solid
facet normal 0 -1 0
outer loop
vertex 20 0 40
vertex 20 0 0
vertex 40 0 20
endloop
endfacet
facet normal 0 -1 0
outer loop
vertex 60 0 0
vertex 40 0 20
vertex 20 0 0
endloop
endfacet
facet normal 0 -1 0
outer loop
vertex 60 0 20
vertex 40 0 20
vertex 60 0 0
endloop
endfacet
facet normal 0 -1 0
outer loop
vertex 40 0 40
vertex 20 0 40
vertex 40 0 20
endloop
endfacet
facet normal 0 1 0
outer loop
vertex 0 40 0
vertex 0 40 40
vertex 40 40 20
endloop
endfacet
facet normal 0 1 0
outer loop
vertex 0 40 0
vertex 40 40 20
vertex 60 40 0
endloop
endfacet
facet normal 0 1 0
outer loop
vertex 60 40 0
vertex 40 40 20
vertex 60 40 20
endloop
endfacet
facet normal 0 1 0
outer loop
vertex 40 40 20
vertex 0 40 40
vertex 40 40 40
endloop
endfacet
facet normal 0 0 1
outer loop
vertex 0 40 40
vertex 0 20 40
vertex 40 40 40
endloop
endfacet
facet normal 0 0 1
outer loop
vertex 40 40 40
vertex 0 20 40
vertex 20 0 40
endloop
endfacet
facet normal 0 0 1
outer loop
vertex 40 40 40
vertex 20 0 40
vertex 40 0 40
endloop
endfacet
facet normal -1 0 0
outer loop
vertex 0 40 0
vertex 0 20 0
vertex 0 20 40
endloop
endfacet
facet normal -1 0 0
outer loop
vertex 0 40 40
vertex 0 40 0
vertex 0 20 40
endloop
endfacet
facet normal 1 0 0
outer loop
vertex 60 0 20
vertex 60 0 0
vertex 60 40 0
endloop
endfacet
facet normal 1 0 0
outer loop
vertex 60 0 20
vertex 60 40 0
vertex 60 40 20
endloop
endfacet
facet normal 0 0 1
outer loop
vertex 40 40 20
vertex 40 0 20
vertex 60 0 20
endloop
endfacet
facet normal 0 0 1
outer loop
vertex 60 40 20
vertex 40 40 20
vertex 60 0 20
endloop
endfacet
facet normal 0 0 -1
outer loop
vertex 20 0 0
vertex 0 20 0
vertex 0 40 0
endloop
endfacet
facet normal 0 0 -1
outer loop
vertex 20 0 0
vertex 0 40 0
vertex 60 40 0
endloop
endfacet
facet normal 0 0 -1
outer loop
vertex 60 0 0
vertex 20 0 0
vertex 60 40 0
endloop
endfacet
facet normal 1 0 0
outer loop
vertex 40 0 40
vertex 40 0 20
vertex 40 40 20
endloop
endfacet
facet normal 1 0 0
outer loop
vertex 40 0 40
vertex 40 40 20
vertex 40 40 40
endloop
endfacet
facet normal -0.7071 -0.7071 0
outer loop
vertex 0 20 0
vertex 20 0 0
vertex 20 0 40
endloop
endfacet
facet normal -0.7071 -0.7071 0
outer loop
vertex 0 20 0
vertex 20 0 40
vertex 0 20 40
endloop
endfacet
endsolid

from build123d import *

# Parameters (mm, degrees)
F0_W     = 60
F0_H     = 40
F1_DEPTH = 40
F2_W     = 20
F2_H     = 20
F3_DEPTH = 40.001
F5_DEPTH = 40.001


with BuildPart() as f1:
    # F0 (on Front) → F1 (new body)
    with BuildSketch(Plane.XZ):
        with Locations((30, 20)):
            Rectangle(F0_W, F0_H)
    extrude(amount=-F1_DEPTH)

    # F2 (on face) → F3 (cut, through all)
    with BuildSketch(Plane.XZ):
        with Locations((50, 30)):
            Rectangle(F2_W, F2_H)
    extrude(amount=-F3_DEPTH, mode=Mode.SUBTRACT)

    # F4 (on face) → F5 (cut, through all)
    with BuildSketch(Plane.XY.offset(40)):
        Polygon((20, 0), (0, 20), (0, 0), align=None)
    extrude(amount=-F5_DEPTH, mode=Mode.SUBTRACT)


solid = f1.part
